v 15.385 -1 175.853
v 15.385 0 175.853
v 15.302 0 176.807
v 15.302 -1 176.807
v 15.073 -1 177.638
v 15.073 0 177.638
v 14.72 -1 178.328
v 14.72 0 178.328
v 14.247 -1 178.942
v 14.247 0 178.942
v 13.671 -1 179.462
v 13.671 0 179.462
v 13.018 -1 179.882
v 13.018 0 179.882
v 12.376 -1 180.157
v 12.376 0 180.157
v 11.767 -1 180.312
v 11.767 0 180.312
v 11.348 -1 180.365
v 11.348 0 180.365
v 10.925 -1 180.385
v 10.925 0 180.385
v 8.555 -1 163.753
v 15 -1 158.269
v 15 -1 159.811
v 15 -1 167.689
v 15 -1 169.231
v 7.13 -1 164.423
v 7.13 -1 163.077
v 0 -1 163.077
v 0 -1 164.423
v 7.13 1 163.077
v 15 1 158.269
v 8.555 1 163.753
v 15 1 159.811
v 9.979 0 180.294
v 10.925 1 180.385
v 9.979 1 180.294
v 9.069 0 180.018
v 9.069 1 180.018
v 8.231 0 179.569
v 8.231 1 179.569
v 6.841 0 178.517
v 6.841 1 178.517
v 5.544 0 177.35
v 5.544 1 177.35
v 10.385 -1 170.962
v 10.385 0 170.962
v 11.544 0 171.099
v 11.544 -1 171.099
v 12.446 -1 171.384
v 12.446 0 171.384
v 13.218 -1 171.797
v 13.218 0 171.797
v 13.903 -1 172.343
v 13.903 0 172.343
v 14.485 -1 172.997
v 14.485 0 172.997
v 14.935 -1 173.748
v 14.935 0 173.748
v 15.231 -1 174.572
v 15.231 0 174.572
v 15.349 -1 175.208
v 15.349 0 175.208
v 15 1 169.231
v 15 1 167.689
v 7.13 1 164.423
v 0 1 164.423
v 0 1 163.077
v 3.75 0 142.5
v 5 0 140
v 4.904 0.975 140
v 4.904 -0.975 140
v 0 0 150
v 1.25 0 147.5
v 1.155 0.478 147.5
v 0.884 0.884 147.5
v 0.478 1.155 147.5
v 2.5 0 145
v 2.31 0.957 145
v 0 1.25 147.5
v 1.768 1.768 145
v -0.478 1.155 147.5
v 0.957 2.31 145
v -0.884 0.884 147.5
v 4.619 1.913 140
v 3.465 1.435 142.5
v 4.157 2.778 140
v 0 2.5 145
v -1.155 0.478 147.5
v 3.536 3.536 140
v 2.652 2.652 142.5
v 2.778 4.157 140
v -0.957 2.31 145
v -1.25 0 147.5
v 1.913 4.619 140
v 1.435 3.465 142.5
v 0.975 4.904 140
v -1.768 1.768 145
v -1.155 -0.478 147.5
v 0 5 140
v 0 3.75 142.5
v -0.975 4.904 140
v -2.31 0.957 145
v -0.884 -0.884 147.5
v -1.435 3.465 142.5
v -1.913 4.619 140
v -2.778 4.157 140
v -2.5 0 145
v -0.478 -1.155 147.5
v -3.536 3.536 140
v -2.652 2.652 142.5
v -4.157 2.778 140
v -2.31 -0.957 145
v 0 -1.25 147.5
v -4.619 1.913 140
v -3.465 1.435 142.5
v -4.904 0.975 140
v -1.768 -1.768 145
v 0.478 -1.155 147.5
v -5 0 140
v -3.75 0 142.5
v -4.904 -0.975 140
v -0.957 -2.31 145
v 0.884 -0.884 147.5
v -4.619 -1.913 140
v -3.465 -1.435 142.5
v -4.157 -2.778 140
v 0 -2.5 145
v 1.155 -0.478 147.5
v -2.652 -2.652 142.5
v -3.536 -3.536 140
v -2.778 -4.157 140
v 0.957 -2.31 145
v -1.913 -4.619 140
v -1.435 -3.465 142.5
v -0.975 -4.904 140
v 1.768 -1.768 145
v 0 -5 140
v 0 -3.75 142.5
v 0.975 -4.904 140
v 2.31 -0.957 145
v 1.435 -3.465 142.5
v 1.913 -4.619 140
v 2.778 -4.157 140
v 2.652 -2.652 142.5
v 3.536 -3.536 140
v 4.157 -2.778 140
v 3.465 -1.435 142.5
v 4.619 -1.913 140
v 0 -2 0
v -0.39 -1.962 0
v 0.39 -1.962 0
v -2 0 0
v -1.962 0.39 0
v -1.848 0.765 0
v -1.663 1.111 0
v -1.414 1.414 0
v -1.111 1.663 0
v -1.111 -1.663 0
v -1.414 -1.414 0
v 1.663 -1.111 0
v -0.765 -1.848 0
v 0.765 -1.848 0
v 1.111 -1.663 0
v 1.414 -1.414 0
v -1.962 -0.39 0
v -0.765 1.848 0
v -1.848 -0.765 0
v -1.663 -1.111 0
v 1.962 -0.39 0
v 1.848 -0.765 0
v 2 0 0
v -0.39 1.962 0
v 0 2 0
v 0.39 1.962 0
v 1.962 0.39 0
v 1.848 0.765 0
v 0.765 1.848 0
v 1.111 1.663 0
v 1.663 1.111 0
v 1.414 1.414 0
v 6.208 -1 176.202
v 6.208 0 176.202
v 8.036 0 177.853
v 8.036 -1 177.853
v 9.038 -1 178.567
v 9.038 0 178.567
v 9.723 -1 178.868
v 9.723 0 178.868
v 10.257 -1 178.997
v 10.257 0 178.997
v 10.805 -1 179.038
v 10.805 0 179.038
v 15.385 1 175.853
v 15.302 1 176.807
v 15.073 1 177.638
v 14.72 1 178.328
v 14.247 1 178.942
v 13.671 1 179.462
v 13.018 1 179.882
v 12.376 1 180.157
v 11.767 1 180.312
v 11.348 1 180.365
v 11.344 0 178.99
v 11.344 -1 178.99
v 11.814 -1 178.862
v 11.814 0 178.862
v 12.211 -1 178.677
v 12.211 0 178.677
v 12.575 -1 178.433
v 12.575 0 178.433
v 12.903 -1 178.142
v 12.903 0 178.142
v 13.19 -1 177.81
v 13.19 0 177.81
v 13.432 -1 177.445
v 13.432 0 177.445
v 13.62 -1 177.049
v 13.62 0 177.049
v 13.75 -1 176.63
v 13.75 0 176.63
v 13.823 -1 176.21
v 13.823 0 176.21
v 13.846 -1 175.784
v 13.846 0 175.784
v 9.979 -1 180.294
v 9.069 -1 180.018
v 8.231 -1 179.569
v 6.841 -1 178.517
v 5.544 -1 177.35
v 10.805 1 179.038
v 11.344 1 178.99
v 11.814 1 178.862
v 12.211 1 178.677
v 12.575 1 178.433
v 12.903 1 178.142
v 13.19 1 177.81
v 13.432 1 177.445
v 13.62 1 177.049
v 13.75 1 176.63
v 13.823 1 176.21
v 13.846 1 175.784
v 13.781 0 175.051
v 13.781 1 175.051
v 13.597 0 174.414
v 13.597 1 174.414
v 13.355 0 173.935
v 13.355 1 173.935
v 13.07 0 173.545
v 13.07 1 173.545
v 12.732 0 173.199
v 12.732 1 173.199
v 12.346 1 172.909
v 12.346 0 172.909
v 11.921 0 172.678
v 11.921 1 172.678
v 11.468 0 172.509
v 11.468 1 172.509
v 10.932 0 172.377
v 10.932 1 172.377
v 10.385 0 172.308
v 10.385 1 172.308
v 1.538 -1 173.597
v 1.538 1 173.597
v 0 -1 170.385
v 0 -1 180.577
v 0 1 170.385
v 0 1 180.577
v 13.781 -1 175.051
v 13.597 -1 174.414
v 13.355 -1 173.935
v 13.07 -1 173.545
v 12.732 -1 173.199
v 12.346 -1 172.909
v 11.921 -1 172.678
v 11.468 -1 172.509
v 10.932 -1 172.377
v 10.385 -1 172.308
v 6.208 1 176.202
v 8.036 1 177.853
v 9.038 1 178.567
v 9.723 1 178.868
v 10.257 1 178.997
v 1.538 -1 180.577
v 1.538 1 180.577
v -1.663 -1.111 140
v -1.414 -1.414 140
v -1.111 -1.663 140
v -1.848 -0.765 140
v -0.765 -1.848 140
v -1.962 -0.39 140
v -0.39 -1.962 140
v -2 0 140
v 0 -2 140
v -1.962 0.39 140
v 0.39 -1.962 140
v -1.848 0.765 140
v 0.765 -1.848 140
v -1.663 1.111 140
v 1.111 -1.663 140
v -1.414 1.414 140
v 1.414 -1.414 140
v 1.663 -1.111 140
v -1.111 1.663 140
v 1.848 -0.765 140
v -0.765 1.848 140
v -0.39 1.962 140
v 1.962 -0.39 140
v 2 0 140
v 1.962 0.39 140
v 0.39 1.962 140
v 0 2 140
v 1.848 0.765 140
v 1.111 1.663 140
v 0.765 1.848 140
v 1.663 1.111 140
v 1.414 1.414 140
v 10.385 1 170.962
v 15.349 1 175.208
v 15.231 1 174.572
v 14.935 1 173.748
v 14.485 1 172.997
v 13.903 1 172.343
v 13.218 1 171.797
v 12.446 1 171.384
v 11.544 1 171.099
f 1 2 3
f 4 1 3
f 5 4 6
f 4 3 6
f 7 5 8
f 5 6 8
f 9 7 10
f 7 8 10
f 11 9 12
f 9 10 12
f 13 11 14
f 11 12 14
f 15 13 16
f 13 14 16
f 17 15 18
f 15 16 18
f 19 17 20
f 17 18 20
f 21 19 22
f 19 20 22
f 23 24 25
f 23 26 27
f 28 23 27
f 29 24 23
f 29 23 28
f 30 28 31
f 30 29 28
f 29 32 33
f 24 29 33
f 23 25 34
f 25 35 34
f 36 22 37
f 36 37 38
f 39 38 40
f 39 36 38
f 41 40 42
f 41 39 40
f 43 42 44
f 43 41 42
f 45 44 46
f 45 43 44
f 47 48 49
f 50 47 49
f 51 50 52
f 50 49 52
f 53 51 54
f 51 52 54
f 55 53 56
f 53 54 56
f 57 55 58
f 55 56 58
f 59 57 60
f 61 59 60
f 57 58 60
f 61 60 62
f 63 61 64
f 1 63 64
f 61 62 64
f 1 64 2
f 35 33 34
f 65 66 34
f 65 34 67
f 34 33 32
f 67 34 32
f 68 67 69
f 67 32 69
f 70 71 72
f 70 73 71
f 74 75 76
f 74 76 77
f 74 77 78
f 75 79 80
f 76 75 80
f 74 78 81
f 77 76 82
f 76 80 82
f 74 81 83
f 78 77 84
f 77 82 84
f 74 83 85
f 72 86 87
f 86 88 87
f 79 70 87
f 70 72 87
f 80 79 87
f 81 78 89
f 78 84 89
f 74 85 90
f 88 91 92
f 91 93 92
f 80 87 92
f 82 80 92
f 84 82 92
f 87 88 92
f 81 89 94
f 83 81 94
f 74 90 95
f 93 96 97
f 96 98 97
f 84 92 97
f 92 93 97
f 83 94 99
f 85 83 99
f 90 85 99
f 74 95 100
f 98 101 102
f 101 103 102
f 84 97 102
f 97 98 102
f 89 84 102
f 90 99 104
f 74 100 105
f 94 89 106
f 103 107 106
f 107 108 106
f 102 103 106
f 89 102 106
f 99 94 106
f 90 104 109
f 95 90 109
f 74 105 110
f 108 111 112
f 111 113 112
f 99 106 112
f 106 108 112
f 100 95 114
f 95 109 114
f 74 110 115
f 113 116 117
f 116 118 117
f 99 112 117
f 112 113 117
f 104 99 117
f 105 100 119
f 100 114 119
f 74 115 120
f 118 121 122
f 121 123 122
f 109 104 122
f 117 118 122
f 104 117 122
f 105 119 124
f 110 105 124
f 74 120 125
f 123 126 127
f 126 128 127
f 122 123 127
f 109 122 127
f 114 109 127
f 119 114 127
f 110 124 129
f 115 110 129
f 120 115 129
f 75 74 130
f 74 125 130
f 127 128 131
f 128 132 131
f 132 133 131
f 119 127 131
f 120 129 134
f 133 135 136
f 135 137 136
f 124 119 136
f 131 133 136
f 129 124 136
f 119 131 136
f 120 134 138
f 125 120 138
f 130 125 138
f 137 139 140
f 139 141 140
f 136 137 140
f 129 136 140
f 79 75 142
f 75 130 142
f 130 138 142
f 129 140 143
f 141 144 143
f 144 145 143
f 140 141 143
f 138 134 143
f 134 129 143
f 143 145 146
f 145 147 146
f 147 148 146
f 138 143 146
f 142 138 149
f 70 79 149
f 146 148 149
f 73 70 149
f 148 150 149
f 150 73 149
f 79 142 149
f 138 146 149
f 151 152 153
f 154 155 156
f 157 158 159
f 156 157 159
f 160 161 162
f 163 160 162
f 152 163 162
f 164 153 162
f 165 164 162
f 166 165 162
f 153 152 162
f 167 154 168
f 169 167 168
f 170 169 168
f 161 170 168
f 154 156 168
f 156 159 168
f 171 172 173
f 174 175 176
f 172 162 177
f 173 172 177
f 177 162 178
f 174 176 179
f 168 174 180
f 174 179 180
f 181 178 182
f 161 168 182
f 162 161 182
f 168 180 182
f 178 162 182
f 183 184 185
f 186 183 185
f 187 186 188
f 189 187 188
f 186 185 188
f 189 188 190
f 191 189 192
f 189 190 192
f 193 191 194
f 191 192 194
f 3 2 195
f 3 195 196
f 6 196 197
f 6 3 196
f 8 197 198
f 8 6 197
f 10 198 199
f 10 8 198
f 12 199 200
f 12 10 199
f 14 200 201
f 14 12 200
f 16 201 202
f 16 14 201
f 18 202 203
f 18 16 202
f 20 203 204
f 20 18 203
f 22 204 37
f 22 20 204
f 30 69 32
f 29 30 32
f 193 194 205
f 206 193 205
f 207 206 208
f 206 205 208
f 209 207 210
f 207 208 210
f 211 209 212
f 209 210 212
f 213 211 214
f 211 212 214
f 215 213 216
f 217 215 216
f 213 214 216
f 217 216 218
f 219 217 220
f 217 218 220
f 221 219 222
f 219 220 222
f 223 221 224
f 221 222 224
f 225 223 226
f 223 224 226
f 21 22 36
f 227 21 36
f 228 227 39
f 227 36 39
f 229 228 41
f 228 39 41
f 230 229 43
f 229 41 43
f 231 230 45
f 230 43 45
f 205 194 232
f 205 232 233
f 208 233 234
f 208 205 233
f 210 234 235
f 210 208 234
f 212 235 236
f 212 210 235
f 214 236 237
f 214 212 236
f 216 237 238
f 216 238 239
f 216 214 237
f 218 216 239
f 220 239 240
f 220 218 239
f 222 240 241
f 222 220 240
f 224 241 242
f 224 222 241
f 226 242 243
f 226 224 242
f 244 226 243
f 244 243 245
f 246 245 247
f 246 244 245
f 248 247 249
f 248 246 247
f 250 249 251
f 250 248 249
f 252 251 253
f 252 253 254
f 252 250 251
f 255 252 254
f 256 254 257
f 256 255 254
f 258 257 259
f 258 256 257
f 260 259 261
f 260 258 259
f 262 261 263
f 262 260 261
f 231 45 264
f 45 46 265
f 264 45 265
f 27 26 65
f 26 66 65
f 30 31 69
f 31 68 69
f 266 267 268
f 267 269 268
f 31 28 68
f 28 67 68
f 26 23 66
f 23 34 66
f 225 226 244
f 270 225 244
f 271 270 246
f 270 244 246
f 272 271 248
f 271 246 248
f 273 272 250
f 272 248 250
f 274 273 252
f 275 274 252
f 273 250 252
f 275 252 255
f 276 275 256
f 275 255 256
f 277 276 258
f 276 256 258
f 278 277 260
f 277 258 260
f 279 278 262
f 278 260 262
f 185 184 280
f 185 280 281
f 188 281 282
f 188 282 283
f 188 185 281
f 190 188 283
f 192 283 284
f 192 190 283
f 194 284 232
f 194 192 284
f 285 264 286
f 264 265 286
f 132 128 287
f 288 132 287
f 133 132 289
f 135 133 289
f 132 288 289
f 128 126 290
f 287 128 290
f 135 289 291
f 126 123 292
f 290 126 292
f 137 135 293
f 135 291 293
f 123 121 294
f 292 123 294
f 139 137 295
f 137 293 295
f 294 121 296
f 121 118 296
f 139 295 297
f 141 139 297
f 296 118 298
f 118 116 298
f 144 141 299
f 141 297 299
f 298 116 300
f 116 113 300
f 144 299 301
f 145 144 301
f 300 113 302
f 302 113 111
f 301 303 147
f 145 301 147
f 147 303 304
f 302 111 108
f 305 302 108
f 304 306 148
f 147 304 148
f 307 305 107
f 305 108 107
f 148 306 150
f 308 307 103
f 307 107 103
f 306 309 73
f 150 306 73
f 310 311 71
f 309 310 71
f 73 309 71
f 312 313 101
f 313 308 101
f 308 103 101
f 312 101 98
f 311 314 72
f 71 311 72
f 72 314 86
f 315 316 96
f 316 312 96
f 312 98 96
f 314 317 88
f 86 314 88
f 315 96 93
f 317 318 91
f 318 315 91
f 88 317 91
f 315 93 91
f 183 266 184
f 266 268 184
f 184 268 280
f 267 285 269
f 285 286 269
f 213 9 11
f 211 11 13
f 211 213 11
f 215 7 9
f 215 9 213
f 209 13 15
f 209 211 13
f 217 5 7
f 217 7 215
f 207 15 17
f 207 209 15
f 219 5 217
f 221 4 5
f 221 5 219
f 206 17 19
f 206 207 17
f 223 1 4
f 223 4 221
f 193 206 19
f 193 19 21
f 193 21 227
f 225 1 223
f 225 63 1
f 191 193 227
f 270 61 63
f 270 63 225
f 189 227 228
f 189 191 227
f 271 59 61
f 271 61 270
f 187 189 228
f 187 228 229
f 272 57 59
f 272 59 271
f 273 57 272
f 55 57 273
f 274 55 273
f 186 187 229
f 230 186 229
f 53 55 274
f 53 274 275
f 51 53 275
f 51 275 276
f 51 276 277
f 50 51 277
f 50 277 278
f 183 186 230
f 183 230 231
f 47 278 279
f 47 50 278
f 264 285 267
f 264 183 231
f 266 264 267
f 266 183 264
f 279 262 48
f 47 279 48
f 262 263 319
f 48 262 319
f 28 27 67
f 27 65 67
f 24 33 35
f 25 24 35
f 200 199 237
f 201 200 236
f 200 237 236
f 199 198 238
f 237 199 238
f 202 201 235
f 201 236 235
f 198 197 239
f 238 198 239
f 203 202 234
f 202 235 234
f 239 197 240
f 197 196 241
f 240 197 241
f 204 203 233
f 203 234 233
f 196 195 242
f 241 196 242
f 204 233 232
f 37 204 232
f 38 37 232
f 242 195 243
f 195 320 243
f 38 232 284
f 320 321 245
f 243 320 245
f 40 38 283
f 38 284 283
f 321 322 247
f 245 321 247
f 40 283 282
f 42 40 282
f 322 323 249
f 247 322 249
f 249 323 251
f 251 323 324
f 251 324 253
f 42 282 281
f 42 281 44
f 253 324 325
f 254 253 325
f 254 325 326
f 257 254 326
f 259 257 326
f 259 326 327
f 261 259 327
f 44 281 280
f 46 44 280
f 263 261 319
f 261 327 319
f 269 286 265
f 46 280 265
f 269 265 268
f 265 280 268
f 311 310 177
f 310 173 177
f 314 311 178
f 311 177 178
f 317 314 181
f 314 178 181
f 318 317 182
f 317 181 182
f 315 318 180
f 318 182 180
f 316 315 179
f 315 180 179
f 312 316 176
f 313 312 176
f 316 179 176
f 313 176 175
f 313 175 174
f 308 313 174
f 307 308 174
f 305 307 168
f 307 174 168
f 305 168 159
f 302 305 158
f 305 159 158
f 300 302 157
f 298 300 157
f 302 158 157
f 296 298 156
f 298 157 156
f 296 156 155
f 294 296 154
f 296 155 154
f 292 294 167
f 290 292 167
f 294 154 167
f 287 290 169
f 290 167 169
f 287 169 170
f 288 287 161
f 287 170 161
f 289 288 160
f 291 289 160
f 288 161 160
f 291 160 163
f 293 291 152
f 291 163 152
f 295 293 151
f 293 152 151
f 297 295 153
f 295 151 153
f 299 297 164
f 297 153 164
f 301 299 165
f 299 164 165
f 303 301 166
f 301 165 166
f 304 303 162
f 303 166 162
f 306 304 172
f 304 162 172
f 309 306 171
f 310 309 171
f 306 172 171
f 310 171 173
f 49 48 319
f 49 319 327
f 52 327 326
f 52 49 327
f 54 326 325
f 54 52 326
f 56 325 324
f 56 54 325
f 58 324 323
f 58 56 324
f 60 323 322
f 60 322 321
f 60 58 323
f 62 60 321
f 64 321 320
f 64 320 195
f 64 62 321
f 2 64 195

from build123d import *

# Parameters (mm, degrees)
BOSS_EXTRUDE1_DEPTH        = 1
BOSS_EXTRUDE1_DEPTH_BACK   = 1
BOSS_EXTRUDE1_2_DEPTH      = 1
BOSS_EXTRUDE1_2_DEPTH_BACK = 1


with BuildPart() as part:
    # Sketch2 → Revolve1 (revolve)
    with BuildSketch(Plane(origin=(0, 0, 0), x_dir=(1, 0, 0), z_dir=(0, 1, 0))):
        Polygon((0, -150), (5, -140), (2, -140), (2, 0), (0, 0), align=None)
    revolve(axis=Axis((0, 0, -41.949952025), (0, 0, 1)))


with BuildPart() as body_2:
    # Sketch3 → Boss-Extrude1 (new, two sides: drawn at the far end of the back side and taken through both)
    with BuildSketch(Plane(origin=(0, 0, 0), x_dir=(1, 0, 0), z_dir=(0, 1, 0)).offset(-BOSS_EXTRUDE1_DEPTH_BACK)):
        Polygon((15, -158.269230769), (15, -159.810697115), (8.5546875, -163.753004808), (15, -167.689302885), (15, -169.230769231), (7.130408654, -164.423076923), (0, -164.423076923), (0, -163.076923077), (7.130408654, -163.076923077), align=None)
    extrude(amount=BOSS_EXTRUDE1_DEPTH + BOSS_EXTRUDE1_DEPTH_BACK)


with BuildPart() as body_3:
    # Sketch3 → Boss-Extrude1 2 (new, two sides: drawn at the far end of the back side and taken through both)
    with BuildSketch(Plane(origin=(0, 0, 0), x_dir=(1, 0, 0), z_dir=(0, 1, 0)).offset(-BOSS_EXTRUDE1_2_DEPTH_BACK)):
        with BuildLine():
            Line((10.384615385, -172.307692308), (10.384615385, -170.961538462))
            add(Edge.make_bspline(
                [(10.384615385, -170.961538462), (10.563205784, -170.970310481), (10.913952575, -170.987538494), (11.425328289, -171.068252293), (11.914179653, -171.183636718), (12.376315664, -171.347163365), (12.817256926, -171.549104485), (13.231148249, -171.796338855), (13.622097454, -172.08359584), (13.982702577, -172.410348454), (14.312340745, -172.764905154), (14.600012522, -173.145141596), (14.840286171, -173.547149667), (15.042241714, -173.967442522), (15.193649809, -174.41088097), (15.306041475, -174.873226237), (15.373650782, -175.356568077), (15.380918932, -175.685882086), (15.384615385, -175.853365385)],
                knots=[0, 0, 0, 0, 1.100776268, 2.161895295, 3.184016182, 4.190939212, 5.176500551, 6.166955529, 7.155448256, 8.160289653, 9.16017456, 10.133824356, 11.091467644, 12.04088621, 13.000931625, 13.972173743, 14.968683325, 16, 16, 16, 16], degree=3))
            add(Edge.make_bspline(
                [(15.384615385, -175.853365385), (15.380764857, -176.017842845), (15.373198708, -176.341035179), (15.308222868, -176.812729527), (15.206456047, -177.261775075), (15.063675691, -177.687294074), (14.871742431, -178.085891494), (14.641181551, -178.460561685), (14.374525131, -178.815765159), (14.060580216, -179.135508518), (13.72542714, -179.429114572), (13.367621838, -179.682409951), (12.998067757, -179.899323508), (12.613946893, -180.080127851), (12.211642485, -180.213225589), (11.797011616, -180.314275052), (11.365762426, -180.371392539), (11.073877188, -180.38015864), (10.925480769, -180.384615385)],
                knots=[0, 0, 0, 0, 1.111607364, 2.184268762, 3.212621178, 4.221274766, 5.211760367, 6.196651075, 7.1921475, 8.207485113, 9.220403448, 10.201281604, 11.166441695, 12.114753415, 13.065576456, 14.026450734, 14.996634279, 16, 16, 16, 16], degree=3))
            add(Edge.make_bspline(
                [(10.925480769, -180.384615385), (10.716561478, -180.377358544), (10.302389134, -180.362972209), (9.693754008, -180.239910596), (9.104067926, -180.047711262), (8.629479489, -179.816294019), (8.24705023, -179.582840687), (7.932184351, -179.372465654), (7.593160915, -179.126187893), (7.231115184, -178.840422902), (6.843211305, -178.521082021), (6.42968361, -178.165272749), (5.994804597, -177.770457827), (5.697780591, -177.493349966), (5.543870192, -177.349759615)],
                knots=[0, 0, 0, 0, 1.184426356, 2.348067706, 3.509069118, 4.696110526, 5.333549288, 6.050745305, 6.844228056, 7.710549037, 8.667450064, 9.695053472, 10.805634456, 12, 12, 12, 12], degree=3))
            Line((5.543870192, -177.349759615), (1.538461538, -173.596754808))
            Line((1.538461538, -173.596754808), (1.538461538, -180.576923077))
            Line((1.538461538, -180.576923077), (0, -180.576923077))
            Line((0, -180.576923077), (0, -170.384615385))
            Line((0, -170.384615385), (6.207932692, -176.201923077))
            add(Edge.make_bspline(
                [(6.207932692, -176.201923077), (6.355774514, -176.343566905), (6.639748395, -176.615635711), (7.054467176, -177.000286256), (7.438755758, -177.346320011), (7.794317016, -177.653966516), (8.119135251, -177.923478904), (8.415755986, -178.153994855), (8.681633708, -178.346533206), (8.993975739, -178.550583737), (9.37577944, -178.745159458), (9.840016559, -178.916171607), (10.318969101, -179.019700036), (10.642533031, -179.032182668), (10.805288462, -179.038461538)],
                knots=[0, 0, 0, 0, 1.329530082, 2.553755191, 3.672934919, 4.687409497, 5.60679272, 6.413407421, 7.126401618, 7.737995624, 8.834647426, 9.90044882, 10.943907757, 12, 12, 12, 12], degree=3))
            add(Edge.make_bspline(
                [(10.805288462, -179.038461538), (10.907648622, -179.035764916), (11.109380842, -179.03045039), (11.404957531, -178.982658693), (11.691181234, -178.912443205), (11.964512999, -178.804219447), (12.230328736, -178.674192586), (12.480546816, -178.508073683), (12.723696572, -178.3182434), (12.951440602, -178.098049582), (13.160089498, -177.856317685), (13.344903048, -177.600905463), (13.499357413, -177.330692896), (13.625972124, -177.046806078), (13.725295262, -176.750039938), (13.794117725, -176.439819559), (13.837328376, -176.117002358), (13.843174826, -175.896573089), (13.846153846, -175.784254808)],
                knots=[0, 0, 0, 0, 0.991504627, 1.954065223, 2.895985987, 3.842598665, 4.797835564, 5.759220273, 6.74786863, 7.784730864, 8.824135544, 9.839918996, 10.835834653, 11.835434876, 12.84861661, 13.863796685, 14.911511676, 16, 16, 16, 16], degree=3))
            add(Edge.make_bspline(
                [(13.846153846, -175.784254808), (13.843090349, -175.666950718), (13.837074146, -175.436584855), (13.794963866, -175.098367814), (13.722386696, -174.775687596), (13.622884934, -174.467891001), (13.497611426, -174.174681471), (13.338567276, -173.898710207), (13.151962153, -173.637457681), (12.9392425, -173.391403722), (12.701290357, -173.165318738), (12.439301355, -172.962502138), (12.151571288, -172.789521018), (11.84459911, -172.63618104), (11.510222814, -172.518853263), (11.156545105, -172.418562608), (10.778541069, -172.345708862), (10.518104848, -172.320574965), (10.384615385, -172.307692308)],
                knots=[0, 0, 0, 0, 1.031212865, 2.025131798, 2.990757446, 3.934781266, 4.865570067, 5.788494791, 6.729227313, 7.684356718, 8.643577152, 9.610526866, 10.590658432, 11.59095419, 12.621640561, 13.700587263, 14.82141059, 16, 16, 16, 16], degree=3))
        make_face()
    extrude(amount=BOSS_EXTRUDE1_2_DEPTH + BOSS_EXTRUDE1_2_DEPTH_BACK)


solid = Compound([part.part, body_2.part, body_3.part])
